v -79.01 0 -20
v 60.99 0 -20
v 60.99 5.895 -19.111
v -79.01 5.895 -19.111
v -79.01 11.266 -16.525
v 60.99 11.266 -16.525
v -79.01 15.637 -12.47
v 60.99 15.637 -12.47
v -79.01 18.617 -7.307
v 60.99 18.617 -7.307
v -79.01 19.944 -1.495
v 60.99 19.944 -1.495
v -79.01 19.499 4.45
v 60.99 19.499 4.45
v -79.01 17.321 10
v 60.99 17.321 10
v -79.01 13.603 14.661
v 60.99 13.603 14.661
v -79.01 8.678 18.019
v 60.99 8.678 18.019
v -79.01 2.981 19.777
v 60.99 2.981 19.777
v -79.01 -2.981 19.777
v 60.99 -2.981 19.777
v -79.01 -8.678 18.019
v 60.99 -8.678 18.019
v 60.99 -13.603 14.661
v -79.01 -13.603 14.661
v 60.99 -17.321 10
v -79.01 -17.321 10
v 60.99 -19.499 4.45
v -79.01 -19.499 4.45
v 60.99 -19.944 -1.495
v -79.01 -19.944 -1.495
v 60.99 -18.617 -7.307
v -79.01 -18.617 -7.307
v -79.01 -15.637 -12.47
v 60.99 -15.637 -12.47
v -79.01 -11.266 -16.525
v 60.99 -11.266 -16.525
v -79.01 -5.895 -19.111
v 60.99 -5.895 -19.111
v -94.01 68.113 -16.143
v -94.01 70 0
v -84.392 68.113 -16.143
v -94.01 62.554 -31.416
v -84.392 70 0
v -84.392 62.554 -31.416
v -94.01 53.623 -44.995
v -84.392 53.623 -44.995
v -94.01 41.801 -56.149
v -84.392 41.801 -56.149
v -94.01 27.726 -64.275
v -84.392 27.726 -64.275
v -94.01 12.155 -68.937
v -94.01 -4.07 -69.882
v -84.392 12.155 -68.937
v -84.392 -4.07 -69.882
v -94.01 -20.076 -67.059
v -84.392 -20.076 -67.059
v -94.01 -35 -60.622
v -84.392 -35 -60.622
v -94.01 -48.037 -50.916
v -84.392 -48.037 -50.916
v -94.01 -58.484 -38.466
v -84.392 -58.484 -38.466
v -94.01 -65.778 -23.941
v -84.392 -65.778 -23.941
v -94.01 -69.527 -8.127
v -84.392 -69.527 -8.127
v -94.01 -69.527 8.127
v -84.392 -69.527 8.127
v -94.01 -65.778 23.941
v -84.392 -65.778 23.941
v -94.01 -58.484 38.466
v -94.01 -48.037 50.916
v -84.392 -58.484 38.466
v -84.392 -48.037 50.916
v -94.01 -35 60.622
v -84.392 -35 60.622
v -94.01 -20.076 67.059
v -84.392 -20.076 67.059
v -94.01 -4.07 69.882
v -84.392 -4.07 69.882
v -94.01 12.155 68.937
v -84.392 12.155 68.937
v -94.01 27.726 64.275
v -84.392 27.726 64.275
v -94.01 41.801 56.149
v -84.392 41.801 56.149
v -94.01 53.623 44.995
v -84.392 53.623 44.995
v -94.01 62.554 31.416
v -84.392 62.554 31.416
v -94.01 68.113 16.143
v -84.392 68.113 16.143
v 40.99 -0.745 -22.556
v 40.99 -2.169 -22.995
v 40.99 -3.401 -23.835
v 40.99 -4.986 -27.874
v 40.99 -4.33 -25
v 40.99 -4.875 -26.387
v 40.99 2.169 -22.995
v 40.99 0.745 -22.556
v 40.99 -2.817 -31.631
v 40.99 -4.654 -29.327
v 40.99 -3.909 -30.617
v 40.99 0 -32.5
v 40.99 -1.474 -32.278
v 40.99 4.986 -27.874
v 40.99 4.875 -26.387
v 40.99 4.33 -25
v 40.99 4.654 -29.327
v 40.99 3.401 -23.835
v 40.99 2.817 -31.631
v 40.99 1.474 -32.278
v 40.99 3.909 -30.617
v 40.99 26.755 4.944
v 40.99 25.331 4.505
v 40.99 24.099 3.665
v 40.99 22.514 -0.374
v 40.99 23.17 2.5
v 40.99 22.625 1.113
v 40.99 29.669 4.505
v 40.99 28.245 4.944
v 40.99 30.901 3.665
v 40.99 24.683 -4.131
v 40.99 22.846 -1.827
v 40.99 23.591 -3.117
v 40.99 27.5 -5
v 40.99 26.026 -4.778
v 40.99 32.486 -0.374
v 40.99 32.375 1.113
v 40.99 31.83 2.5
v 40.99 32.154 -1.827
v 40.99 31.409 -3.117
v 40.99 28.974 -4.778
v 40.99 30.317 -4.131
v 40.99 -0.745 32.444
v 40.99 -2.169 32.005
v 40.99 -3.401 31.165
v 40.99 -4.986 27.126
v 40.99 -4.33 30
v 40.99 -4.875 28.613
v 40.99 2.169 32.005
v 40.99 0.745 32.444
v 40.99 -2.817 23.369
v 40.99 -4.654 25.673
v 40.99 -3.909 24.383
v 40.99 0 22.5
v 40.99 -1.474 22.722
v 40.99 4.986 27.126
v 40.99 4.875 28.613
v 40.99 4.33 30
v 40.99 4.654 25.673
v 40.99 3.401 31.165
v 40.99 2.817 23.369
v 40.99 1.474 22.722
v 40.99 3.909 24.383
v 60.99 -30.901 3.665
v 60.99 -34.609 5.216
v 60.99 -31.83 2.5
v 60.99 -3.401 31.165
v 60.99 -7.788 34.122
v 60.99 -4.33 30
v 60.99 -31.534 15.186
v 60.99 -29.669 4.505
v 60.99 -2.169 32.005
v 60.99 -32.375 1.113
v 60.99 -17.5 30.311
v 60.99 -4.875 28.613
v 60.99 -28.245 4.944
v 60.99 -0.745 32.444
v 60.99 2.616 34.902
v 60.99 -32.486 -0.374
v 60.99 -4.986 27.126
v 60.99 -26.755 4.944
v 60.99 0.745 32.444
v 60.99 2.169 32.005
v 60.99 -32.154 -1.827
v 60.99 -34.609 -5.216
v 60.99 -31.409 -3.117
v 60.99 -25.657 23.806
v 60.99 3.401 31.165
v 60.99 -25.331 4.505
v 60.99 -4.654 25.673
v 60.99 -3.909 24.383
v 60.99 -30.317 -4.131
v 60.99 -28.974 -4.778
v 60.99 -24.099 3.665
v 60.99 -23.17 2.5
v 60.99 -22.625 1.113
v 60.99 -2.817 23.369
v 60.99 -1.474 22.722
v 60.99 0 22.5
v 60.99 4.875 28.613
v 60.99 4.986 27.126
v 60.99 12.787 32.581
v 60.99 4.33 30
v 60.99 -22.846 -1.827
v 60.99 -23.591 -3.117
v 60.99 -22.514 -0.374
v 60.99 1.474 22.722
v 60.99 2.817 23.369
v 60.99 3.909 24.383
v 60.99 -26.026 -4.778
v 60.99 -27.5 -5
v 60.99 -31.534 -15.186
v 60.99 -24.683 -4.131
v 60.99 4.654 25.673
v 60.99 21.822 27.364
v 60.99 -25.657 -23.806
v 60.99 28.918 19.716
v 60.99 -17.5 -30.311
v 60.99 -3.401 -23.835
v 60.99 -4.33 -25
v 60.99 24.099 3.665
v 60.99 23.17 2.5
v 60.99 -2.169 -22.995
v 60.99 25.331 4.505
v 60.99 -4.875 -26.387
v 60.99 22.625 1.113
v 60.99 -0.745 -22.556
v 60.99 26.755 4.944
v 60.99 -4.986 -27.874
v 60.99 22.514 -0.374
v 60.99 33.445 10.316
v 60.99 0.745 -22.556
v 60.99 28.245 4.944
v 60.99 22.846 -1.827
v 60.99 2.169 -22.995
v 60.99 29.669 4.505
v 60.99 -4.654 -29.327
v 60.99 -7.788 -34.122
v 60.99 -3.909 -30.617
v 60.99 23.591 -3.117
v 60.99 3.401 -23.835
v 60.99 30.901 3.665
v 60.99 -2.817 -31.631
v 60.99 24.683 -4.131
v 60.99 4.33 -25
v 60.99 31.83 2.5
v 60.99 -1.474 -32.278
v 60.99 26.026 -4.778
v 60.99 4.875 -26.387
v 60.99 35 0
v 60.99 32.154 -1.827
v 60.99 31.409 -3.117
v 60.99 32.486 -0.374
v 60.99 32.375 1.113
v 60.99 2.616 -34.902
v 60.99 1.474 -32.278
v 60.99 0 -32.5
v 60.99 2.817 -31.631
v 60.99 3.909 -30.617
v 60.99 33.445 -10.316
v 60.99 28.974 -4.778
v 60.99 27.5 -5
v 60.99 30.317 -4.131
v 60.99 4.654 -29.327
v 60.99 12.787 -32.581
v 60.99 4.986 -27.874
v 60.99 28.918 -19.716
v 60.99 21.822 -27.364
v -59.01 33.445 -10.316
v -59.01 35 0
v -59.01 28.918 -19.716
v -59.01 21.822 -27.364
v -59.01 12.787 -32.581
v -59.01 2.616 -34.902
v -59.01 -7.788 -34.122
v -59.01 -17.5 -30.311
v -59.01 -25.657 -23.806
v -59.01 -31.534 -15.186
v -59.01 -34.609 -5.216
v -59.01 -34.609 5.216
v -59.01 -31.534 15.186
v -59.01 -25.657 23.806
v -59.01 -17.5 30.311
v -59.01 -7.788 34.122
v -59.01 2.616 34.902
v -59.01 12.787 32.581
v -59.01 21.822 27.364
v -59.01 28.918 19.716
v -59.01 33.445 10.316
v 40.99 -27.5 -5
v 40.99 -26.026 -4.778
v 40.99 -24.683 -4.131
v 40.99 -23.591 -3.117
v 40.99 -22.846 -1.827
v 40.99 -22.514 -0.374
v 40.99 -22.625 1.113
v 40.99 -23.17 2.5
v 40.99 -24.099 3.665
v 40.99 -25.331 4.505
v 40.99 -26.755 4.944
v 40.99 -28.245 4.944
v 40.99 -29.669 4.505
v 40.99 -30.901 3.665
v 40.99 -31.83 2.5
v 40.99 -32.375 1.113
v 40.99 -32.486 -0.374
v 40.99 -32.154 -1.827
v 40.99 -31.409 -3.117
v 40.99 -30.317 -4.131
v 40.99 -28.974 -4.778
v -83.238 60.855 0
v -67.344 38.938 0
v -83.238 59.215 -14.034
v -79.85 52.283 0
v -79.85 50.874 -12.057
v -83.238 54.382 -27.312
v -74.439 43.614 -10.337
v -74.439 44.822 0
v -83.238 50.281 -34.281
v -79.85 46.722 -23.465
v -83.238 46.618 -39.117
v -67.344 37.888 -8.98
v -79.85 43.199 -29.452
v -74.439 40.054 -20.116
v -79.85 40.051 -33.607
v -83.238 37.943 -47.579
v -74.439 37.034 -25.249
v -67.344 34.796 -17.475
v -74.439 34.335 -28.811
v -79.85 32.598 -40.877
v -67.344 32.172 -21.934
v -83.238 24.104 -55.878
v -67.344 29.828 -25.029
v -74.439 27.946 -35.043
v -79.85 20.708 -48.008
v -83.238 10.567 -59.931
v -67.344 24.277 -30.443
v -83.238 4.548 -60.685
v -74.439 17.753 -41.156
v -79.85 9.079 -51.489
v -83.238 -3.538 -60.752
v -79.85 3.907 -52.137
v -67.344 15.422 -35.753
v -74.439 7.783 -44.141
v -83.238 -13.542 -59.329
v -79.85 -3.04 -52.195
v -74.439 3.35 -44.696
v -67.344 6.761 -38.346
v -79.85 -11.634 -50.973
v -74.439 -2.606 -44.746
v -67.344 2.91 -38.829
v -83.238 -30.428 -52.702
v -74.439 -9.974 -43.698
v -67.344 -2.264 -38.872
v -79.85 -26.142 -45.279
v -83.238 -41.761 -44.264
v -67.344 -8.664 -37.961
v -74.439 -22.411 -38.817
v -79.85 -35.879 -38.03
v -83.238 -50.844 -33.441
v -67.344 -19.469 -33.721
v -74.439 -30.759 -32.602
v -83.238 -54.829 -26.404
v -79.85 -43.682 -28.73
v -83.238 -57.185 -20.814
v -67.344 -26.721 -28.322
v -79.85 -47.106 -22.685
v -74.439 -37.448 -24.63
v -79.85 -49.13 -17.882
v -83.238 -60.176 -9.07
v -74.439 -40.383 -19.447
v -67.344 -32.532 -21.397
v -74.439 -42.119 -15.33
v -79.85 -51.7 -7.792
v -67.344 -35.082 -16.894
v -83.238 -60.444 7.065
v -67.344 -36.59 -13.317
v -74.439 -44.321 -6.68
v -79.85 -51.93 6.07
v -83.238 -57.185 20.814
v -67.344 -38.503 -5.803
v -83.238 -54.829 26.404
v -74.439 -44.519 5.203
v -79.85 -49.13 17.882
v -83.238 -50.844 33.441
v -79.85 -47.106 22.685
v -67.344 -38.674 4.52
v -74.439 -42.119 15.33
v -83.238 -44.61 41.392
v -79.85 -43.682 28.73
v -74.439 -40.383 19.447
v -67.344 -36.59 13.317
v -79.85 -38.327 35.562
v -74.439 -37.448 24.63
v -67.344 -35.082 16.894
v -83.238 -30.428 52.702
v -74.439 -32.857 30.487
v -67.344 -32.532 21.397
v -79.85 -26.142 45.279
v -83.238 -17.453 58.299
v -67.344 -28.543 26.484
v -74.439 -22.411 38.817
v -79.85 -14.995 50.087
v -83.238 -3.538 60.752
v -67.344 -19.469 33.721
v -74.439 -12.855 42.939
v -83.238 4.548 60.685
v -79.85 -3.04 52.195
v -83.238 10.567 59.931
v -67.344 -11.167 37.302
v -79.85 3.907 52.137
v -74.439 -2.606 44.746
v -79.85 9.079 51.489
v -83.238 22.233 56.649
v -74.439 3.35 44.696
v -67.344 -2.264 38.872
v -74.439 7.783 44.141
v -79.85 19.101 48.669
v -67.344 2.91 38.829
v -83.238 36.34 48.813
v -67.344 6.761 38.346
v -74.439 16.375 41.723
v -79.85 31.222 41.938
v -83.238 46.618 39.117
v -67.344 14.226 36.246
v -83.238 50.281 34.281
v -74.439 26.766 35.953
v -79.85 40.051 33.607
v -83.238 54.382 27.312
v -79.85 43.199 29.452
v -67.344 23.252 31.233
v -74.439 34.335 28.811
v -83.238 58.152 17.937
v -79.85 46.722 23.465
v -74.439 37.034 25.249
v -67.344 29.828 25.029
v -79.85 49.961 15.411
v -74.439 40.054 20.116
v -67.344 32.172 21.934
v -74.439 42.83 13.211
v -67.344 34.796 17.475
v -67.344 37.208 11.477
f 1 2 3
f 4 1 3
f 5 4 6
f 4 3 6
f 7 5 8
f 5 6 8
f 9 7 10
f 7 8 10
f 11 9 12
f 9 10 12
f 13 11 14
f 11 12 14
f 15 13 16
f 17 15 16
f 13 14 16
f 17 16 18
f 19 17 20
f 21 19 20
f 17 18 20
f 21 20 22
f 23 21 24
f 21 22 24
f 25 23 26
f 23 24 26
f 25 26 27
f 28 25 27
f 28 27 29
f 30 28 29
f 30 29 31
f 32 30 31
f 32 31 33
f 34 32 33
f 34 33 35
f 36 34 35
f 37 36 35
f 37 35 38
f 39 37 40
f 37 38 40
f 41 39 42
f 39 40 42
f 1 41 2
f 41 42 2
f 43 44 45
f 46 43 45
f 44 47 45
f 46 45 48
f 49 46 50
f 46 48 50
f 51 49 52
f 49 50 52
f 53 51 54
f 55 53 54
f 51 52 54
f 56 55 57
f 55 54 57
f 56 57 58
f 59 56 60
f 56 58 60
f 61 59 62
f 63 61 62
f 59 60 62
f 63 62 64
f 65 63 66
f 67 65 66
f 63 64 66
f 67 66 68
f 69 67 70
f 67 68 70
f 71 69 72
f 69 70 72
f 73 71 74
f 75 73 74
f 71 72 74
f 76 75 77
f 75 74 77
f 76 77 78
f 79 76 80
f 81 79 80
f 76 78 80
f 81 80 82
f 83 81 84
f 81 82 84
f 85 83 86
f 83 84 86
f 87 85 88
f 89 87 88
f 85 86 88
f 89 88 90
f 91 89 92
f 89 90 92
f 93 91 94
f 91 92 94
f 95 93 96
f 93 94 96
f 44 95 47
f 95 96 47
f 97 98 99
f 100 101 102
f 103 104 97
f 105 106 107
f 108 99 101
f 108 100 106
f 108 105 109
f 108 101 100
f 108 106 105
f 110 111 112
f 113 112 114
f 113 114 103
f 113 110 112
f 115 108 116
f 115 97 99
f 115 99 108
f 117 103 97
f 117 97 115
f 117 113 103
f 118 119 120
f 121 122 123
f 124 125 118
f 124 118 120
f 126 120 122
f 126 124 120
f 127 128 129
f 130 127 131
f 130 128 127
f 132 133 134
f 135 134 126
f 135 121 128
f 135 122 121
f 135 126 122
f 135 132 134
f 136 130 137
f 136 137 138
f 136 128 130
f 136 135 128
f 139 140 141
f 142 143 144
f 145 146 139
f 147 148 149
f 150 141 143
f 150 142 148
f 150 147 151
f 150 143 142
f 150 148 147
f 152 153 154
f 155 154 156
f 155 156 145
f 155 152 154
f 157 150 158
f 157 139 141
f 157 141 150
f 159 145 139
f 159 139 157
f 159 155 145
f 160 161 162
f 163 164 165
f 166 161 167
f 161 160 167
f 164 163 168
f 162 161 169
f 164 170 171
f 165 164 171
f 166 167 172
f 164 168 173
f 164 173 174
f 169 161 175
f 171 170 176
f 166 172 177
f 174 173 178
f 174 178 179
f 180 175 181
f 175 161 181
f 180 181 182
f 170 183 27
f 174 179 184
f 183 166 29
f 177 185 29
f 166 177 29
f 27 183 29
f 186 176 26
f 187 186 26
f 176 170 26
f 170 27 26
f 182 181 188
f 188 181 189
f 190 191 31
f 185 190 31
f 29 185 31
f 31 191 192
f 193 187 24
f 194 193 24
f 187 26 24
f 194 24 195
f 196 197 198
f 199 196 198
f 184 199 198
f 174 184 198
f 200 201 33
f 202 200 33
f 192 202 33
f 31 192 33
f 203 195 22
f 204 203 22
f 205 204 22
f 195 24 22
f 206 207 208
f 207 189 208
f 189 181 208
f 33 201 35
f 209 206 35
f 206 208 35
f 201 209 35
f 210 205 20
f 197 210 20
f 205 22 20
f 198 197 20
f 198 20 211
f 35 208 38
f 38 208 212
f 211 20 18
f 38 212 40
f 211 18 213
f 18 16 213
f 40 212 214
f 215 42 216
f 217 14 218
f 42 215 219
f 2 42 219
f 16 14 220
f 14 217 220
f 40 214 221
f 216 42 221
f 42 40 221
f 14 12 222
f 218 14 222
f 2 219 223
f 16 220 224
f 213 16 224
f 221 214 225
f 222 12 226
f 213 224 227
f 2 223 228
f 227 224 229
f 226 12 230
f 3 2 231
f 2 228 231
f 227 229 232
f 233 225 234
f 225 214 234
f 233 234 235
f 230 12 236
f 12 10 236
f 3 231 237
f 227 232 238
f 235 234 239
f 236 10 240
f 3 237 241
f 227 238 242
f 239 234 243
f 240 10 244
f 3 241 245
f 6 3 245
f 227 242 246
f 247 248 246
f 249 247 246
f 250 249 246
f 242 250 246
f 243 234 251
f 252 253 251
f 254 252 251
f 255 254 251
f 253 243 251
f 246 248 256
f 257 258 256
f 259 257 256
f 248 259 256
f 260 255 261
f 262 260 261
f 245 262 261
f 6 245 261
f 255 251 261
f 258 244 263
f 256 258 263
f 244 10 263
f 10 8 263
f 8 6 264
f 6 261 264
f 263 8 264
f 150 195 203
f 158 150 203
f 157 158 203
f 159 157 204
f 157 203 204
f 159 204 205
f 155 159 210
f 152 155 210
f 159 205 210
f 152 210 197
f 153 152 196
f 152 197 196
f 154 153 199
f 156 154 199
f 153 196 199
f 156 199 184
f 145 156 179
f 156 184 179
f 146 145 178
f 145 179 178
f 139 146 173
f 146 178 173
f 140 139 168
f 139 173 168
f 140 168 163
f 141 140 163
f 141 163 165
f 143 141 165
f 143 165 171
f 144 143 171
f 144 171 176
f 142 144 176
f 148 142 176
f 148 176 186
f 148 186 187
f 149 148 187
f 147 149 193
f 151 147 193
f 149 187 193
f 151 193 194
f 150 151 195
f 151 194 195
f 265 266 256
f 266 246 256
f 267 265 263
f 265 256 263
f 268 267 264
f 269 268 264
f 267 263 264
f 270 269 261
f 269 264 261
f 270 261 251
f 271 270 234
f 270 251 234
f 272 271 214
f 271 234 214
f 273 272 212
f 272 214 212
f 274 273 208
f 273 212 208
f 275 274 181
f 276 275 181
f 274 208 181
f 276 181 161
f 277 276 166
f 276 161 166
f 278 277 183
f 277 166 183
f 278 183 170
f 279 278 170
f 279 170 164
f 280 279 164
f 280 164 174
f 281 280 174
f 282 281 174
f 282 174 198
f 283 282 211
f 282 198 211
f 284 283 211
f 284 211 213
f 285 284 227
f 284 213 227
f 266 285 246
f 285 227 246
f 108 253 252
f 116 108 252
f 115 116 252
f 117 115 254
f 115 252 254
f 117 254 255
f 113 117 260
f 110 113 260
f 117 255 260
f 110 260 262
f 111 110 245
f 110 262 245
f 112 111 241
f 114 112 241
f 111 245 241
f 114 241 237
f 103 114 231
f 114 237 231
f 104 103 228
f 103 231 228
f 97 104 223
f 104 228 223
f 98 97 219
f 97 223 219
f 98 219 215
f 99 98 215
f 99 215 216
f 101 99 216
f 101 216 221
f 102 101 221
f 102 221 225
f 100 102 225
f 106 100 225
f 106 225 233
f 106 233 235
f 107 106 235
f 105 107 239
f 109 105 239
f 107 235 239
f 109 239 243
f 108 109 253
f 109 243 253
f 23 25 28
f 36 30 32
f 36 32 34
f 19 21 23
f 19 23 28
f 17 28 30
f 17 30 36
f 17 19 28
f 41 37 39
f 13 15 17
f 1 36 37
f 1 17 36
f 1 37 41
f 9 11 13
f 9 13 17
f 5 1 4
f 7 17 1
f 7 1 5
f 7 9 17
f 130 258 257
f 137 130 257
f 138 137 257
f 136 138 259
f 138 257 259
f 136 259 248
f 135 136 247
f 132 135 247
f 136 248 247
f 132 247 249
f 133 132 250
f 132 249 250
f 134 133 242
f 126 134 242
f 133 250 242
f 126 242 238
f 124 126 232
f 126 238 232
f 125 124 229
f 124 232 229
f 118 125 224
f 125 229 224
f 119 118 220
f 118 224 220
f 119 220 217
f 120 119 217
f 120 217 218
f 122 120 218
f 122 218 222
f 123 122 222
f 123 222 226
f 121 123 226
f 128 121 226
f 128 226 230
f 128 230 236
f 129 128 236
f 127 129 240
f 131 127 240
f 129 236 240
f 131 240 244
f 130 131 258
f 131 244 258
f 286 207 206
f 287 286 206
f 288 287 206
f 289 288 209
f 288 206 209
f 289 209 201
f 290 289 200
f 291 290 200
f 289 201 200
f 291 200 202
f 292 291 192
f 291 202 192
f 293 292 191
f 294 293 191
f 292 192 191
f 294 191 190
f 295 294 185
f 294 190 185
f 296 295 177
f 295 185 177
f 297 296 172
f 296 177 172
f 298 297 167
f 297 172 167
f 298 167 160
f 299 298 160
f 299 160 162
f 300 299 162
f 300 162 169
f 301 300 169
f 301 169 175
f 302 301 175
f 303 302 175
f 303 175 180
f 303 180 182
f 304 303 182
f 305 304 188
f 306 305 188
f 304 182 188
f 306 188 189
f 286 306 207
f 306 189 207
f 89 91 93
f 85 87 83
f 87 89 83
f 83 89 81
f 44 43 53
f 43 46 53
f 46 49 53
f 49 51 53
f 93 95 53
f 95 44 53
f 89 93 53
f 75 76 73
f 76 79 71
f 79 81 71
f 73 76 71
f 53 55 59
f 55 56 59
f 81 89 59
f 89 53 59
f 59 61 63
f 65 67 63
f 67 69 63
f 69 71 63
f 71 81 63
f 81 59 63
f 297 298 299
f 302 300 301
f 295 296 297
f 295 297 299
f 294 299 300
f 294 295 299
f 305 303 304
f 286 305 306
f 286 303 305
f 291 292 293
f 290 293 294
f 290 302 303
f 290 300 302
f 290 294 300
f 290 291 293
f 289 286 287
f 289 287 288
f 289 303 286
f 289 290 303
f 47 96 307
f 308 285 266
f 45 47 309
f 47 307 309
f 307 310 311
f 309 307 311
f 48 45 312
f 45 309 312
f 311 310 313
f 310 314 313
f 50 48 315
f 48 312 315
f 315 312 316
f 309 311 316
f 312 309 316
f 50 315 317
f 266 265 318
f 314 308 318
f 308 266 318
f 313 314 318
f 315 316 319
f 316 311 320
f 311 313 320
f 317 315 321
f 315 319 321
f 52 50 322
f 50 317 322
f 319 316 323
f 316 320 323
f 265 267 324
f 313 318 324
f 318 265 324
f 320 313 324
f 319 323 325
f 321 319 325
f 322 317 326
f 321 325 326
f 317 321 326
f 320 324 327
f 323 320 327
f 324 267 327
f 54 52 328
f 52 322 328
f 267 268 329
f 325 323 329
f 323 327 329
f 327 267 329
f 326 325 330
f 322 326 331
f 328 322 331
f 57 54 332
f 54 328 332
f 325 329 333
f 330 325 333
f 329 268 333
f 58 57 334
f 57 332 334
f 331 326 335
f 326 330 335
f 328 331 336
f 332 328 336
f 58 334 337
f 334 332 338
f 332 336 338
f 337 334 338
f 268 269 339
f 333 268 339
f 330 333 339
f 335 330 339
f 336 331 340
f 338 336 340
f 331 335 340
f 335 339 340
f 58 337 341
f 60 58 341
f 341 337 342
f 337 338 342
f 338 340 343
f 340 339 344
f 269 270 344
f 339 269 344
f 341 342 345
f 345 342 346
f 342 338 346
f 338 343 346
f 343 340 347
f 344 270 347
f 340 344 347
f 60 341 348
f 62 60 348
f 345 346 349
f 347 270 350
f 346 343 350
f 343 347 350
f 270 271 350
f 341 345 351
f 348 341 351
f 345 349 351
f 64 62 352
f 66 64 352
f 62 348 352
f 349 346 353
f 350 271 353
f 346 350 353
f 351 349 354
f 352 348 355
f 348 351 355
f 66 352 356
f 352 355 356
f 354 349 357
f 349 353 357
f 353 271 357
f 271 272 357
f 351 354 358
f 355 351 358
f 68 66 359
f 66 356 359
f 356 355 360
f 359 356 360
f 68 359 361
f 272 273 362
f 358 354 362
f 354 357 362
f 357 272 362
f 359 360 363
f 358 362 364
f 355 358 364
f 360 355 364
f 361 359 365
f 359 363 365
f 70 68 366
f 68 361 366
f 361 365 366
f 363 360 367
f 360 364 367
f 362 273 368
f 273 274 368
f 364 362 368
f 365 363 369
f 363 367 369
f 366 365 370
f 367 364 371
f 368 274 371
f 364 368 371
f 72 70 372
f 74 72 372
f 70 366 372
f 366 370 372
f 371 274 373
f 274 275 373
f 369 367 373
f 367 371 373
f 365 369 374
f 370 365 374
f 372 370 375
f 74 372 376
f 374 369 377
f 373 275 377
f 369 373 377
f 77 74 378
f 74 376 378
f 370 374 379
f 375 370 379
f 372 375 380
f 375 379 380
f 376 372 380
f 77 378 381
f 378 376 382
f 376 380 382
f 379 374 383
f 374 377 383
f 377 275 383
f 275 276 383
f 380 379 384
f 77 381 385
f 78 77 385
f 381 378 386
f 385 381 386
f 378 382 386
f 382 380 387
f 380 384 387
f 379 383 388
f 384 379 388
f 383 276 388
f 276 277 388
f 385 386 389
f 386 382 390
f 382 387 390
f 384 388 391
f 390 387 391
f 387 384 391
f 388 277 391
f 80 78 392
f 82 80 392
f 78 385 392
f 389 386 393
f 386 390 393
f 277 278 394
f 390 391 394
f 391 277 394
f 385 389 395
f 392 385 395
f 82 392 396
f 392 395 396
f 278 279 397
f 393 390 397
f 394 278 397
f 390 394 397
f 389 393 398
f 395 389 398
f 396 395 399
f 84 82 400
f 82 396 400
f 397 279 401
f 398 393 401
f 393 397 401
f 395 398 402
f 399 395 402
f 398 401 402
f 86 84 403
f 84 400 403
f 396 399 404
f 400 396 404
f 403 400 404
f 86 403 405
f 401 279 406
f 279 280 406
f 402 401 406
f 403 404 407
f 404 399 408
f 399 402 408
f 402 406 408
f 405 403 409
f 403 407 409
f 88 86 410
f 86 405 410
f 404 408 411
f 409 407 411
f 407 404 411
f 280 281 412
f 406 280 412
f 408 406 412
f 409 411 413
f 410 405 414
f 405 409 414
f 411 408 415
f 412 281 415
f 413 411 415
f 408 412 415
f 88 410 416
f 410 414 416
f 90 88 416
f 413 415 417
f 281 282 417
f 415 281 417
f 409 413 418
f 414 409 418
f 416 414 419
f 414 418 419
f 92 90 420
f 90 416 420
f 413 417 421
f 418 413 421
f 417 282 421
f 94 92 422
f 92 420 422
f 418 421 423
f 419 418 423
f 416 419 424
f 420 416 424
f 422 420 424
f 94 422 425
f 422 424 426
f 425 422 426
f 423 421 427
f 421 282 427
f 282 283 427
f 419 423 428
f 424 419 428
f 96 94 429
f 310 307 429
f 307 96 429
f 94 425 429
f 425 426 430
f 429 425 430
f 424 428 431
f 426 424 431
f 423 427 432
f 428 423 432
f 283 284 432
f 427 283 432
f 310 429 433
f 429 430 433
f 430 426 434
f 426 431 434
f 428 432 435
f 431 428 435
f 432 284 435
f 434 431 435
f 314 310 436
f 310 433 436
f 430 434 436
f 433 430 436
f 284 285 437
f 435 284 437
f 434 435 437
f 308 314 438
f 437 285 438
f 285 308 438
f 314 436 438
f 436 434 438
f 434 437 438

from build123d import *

# Parameters (mm, degrees)
ESBO_O8_R             = 20
CORTE_EXTRUS_O1_DEPTH = 140
ESBO_O9_R             = 5
CORTE_EXTRUS_O2_DEPTH = 20


with BuildPart() as part:
    # Esboço1 → Revolução1 (revolve)
    with BuildSketch(Plane.XY):
        with BuildLine():
            Line((-67.020117474, 0), (-94.010110831, 0))
            Line((-94.010110831, 0), (-94.010110831, 70))
            Line((-94.010110831, 70), (-84.391943284, 70))
            ThreePointArc((-84.391943284, 70), (-77.378586892, 48.382660787), (-59.010110831, 35))
            Line((-59.010110831, 35), (60.989889169, 35))
            Line((60.989889169, 35), (60.989889169, 0))
            Line((60.989889169, 0), (-67.020117474, 0))
        make_face()
    revolve(axis=Axis((-67.020117474, 0, 0), (-1, 0, 0)))

    # Esboço8 → Corte-extrusão1 (cut)
    with BuildSketch(Plane(origin=(60.989889169, 0, 0), x_dir=(0, 0, -1), z_dir=(1, 0, 0))):
        Circle(ESBO_O8_R)
    extrude(amount=-CORTE_EXTRUS_O1_DEPTH, mode=Mode.SUBTRACT)

    # Esboço9 → Corte-extrusão2 (cut)
    with BuildSketch(Plane(origin=(60.989889169, 0, 0), x_dir=(0, 0, -1), z_dir=(1, 0, 0))):
        with Locations((0, 27.5)):
            Circle(ESBO_O9_R)
        with Locations((27.5, 0)):
            Circle(ESBO_O9_R)
        with Locations((-27.5, 0)):
            Circle(ESBO_O9_R)
        with Locations((0, -27.5)):
            Circle(ESBO_O9_R)
    extrude(amount=-CORTE_EXTRUS_O2_DEPTH, mode=Mode.SUBTRACT)


solid = part.part
